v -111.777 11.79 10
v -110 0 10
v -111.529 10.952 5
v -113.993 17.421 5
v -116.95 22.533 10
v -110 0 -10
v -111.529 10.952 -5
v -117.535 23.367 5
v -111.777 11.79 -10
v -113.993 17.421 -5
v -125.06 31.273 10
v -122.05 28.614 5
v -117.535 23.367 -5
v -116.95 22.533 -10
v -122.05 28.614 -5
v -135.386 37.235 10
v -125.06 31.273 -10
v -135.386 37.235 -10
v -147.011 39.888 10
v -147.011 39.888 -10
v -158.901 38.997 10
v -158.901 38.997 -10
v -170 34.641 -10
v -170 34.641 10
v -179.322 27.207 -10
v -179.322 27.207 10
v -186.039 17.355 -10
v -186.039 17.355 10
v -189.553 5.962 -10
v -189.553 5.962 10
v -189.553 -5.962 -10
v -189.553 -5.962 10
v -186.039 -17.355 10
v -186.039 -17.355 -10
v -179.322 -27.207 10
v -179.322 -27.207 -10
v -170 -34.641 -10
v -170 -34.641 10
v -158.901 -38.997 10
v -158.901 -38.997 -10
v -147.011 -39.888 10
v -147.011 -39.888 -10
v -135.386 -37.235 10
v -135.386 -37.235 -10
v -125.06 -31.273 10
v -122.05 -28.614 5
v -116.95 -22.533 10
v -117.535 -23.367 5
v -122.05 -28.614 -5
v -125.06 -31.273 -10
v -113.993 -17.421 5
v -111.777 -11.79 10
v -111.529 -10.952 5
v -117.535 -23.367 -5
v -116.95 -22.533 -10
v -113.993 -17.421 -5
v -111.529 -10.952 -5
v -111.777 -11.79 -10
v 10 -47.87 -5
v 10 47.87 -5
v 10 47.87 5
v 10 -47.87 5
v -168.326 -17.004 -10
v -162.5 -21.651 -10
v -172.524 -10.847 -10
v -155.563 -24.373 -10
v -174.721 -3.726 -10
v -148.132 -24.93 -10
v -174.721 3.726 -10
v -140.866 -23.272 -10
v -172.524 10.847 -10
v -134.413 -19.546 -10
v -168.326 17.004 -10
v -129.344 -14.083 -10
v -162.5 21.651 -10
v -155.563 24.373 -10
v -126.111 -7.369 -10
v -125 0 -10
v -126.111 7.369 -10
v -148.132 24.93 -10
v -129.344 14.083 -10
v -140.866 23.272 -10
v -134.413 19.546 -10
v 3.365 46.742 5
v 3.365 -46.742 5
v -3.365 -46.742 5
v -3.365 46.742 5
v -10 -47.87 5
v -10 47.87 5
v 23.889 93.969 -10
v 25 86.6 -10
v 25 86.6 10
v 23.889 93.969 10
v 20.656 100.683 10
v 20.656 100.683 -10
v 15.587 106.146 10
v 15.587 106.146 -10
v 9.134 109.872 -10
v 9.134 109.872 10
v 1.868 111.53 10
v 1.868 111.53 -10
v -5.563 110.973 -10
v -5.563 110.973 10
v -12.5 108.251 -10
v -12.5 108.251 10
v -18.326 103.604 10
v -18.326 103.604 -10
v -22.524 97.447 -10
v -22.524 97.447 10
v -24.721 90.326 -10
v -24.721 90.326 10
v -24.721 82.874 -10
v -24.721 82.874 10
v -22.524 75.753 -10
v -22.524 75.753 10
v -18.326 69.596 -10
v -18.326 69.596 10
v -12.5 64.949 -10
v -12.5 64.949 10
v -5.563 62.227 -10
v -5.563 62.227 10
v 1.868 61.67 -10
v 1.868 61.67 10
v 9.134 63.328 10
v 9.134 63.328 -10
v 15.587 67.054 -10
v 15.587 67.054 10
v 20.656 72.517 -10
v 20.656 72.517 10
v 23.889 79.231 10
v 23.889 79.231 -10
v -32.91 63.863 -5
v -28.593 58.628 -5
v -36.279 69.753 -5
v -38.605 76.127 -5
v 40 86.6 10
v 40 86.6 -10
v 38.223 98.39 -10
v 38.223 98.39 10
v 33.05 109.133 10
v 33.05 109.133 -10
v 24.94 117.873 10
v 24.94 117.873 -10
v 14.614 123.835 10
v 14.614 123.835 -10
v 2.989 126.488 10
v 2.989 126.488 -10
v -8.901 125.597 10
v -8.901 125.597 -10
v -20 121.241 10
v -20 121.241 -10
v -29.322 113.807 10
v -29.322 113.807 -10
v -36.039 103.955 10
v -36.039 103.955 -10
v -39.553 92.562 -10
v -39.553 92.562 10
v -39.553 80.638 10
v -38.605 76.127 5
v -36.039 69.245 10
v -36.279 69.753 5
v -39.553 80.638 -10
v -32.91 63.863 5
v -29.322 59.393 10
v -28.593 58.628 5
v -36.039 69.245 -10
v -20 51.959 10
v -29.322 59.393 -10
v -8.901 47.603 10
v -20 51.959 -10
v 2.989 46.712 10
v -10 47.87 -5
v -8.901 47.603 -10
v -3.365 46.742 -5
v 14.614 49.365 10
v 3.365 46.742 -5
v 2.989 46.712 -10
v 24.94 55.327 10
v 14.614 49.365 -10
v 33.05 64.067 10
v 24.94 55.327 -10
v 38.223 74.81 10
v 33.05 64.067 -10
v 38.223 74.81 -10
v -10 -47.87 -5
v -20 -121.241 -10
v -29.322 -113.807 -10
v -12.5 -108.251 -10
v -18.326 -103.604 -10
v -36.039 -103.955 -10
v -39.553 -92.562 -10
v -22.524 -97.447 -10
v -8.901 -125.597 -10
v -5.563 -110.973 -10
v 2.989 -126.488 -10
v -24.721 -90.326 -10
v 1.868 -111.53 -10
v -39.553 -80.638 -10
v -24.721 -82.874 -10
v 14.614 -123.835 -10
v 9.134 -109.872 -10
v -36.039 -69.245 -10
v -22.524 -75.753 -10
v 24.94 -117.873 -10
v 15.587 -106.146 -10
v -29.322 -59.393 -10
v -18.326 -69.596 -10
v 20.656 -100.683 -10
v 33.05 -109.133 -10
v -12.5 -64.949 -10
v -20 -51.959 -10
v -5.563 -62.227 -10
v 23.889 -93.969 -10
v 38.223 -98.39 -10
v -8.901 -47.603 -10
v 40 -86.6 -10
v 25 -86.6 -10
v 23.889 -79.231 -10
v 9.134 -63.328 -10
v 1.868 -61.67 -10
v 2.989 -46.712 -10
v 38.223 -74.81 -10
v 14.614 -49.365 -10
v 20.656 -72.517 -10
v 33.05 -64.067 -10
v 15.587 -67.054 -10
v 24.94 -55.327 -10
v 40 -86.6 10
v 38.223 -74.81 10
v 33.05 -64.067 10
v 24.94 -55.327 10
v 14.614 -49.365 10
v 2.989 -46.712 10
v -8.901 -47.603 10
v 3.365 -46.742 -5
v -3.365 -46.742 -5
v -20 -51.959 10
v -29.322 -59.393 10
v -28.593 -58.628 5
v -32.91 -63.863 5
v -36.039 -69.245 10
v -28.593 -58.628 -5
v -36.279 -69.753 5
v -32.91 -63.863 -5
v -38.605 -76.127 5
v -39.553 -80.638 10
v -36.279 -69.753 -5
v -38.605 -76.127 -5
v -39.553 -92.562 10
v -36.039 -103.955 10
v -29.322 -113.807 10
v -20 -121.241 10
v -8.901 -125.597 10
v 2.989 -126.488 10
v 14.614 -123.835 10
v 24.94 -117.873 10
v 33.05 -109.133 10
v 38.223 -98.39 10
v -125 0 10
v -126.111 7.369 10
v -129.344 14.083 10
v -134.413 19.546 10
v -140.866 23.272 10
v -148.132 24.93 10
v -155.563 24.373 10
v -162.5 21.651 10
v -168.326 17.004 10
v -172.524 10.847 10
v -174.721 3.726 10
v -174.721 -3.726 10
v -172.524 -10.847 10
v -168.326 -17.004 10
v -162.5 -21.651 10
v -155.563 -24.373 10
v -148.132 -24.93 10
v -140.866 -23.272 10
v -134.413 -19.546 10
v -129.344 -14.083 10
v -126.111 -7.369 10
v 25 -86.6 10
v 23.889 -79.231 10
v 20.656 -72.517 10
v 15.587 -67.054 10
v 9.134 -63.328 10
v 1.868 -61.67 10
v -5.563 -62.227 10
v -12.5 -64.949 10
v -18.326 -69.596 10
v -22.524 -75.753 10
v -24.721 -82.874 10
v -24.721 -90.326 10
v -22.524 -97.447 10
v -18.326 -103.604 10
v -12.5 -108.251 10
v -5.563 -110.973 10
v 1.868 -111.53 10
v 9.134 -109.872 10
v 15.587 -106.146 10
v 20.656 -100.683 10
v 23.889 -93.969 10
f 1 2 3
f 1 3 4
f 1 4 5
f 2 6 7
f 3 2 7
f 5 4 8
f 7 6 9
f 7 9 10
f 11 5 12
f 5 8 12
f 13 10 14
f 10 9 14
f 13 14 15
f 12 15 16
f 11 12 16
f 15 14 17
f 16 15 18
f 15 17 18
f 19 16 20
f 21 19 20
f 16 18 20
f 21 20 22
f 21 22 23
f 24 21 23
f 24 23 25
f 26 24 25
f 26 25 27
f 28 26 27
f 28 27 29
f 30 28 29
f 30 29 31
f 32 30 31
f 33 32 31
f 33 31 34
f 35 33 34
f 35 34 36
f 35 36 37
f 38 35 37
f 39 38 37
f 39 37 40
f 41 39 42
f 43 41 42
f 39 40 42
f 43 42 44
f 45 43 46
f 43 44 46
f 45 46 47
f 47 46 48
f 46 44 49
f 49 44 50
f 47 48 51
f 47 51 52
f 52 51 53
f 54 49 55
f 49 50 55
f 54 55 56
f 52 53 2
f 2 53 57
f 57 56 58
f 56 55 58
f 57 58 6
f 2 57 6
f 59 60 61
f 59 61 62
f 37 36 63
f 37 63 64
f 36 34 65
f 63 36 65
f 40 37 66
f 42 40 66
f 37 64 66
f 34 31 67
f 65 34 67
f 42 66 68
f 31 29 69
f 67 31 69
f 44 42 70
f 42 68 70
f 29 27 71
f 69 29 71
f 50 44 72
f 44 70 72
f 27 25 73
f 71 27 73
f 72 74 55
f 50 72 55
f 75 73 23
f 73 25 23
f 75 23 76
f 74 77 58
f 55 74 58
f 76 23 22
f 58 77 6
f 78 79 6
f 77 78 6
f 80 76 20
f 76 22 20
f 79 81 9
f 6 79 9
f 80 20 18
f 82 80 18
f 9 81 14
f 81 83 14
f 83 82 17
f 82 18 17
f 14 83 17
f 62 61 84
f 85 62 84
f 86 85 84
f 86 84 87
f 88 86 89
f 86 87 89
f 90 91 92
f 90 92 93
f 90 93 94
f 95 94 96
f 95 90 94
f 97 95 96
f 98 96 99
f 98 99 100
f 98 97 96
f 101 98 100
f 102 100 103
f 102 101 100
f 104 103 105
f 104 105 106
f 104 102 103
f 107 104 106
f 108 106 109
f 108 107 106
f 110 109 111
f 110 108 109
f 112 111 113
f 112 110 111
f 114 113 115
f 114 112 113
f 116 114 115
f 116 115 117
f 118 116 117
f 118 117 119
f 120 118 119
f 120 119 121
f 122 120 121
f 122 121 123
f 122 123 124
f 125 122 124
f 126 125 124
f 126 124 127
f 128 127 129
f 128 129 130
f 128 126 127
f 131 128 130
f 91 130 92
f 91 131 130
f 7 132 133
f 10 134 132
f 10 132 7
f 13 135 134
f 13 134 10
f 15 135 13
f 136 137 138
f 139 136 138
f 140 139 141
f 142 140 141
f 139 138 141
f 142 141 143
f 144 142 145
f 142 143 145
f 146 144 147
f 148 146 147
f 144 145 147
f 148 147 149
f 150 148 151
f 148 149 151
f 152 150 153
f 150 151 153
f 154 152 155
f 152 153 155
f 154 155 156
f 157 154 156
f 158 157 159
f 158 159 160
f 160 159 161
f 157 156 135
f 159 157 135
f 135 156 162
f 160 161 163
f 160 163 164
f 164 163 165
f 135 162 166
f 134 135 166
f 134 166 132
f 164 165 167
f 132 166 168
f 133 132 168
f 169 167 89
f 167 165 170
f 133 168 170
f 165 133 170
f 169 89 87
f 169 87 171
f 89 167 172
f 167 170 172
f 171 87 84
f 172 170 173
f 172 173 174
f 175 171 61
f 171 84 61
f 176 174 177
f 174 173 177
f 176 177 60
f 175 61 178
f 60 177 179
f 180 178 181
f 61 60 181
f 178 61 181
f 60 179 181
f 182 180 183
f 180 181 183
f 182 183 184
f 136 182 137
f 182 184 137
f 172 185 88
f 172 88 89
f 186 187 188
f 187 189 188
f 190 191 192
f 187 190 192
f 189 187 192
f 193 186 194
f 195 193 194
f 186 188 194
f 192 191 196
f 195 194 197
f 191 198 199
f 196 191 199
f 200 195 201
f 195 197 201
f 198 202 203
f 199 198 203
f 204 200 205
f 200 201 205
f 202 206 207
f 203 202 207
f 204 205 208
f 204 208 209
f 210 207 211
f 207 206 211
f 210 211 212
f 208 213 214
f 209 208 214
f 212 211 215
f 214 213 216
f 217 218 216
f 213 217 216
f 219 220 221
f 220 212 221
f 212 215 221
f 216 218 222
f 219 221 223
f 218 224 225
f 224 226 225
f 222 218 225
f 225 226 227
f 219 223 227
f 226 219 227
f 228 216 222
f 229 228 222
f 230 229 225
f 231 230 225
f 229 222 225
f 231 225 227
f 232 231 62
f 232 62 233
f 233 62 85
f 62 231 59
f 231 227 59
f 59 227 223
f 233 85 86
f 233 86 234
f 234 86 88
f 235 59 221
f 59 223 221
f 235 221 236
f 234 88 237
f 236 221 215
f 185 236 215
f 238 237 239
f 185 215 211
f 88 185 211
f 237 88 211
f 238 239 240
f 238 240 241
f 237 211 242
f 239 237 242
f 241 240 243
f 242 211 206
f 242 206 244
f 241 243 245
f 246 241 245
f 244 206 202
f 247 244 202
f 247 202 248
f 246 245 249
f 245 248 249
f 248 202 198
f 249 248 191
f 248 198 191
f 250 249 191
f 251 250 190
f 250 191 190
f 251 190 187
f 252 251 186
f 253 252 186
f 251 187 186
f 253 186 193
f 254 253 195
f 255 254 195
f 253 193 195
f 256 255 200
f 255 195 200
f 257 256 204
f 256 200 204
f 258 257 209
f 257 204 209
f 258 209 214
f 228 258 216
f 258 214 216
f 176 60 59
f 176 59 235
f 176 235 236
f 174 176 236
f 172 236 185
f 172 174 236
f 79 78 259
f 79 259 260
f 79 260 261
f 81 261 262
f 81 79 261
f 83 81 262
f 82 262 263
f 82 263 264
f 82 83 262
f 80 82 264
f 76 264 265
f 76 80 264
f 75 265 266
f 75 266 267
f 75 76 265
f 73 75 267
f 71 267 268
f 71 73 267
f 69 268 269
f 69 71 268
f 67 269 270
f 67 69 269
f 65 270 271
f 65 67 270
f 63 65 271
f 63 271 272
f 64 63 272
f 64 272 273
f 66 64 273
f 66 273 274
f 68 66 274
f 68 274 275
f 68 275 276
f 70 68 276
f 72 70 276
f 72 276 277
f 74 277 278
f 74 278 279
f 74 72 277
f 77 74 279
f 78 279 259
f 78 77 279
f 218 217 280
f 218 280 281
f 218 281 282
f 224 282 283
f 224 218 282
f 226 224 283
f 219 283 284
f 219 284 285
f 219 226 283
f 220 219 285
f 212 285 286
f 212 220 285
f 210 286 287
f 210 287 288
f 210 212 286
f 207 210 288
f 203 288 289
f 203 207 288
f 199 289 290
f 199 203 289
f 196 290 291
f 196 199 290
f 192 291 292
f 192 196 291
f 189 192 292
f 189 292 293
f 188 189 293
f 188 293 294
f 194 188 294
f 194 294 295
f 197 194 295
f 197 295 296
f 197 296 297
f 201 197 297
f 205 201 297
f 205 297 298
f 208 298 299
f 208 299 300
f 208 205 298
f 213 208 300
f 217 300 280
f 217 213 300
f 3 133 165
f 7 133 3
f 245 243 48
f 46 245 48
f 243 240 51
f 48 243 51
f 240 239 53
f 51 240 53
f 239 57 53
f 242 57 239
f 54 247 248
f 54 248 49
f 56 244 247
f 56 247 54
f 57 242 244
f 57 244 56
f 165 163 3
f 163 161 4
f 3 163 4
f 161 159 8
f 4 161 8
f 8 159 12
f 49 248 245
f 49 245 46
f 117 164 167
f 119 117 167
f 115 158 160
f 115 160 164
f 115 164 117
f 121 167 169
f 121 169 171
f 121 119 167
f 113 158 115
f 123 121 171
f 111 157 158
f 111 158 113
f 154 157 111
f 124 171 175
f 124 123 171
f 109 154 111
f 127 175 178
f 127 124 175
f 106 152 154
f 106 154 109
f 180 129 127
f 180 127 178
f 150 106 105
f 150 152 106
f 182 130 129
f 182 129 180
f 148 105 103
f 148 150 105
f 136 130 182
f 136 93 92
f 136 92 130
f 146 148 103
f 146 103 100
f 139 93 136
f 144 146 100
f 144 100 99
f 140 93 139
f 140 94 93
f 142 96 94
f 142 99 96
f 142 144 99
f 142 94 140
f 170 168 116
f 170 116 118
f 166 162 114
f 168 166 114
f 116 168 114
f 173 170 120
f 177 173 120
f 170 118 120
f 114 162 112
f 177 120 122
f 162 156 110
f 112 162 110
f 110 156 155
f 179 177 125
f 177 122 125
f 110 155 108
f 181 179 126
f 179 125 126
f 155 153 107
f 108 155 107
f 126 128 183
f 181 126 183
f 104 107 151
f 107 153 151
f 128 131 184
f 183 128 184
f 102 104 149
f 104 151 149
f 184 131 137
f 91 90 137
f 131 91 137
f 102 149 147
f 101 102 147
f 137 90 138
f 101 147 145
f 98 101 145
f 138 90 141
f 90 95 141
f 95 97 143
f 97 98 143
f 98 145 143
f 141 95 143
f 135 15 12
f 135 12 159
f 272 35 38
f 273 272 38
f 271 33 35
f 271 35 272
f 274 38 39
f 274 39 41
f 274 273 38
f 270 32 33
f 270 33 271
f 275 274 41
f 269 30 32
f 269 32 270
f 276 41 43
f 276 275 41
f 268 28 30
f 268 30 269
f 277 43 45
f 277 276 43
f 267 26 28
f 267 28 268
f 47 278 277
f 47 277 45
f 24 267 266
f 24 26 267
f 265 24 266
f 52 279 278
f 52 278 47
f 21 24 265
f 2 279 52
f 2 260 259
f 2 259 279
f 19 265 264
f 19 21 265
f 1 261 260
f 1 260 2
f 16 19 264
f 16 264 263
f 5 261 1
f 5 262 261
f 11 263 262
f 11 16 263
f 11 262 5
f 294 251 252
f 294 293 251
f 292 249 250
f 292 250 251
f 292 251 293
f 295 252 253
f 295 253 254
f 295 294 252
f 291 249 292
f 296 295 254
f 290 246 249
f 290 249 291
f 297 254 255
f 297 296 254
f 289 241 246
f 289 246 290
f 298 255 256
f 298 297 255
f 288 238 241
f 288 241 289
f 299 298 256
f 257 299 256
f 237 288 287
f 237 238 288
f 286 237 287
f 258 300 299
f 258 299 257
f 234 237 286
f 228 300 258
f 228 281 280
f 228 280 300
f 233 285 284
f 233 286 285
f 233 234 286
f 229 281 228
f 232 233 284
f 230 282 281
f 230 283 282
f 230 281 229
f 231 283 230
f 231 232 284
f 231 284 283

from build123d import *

# Parameters (mm, degrees)
BOSS_EXTRUDE1_DEPTH        = 5
BOSS_EXTRUDE1_DEPTH_BACK   = 5
BOSS_EXTRUDE1_2_DEPTH      = 5
BOSS_EXTRUDE1_2_DEPTH_BACK = 5
BOSS_EXTRUDE1_3_DEPTH      = 5
BOSS_EXTRUDE1_3_DEPTH_BACK = 5
BOSS_EXTRUDE2_DEPTH        = 10
BOSS_EXTRUDE2_DEPTH_BACK   = 10
SKETCH1_6_R                = 40
SKETCH1_6_R_2              = 25


with BuildPart() as part:
    # Sketch1 → Boss-Extrude1 (new, two sides: drawn at the far end of the back side and taken through both)
    with BuildSketch(Plane.XY.offset(-BOSS_EXTRUDE1_DEPTH_BACK)):
        with BuildLine():
            Line((10, 47.870166538), (10, -47.870166538))
            ThreePointArc((10, -47.870166538), (0, -46.6), (-10, -47.870166538))
            Line((-10, -47.870166538), (-10, 47.870166538))
            ThreePointArc((-10, 47.870166538), (0, 46.6), (10, 47.870166538))
        make_face()
    extrude(amount=BOSS_EXTRUDE1_DEPTH + BOSS_EXTRUDE1_DEPTH_BACK)



with BuildPart() as body_2:
    # Sketch1 → Boss-Extrude1 2 (new, two sides: drawn at the far end of the back side and taken through both)
    with BuildSketch(Plane.XY.offset(-BOSS_EXTRUDE1_2_DEPTH_BACK)):
        with BuildLine():
            Line((-122.049730922, 28.614375032), (-38.604515092, 76.126633087))
            ThreePointArc((-38.604515092, 76.126633087), (-34.719424314, 66.736425918), (-28.593413405, 58.628287327))
            Line((-28.593413405, 58.628287327), (-111.528626884, 10.952326263))
            ThreePointArc((-111.528626884, 10.952326263), (-115.635110511, 20.470817531), (-122.049730922, 28.614375032))
        make_face()
    extrude(amount=BOSS_EXTRUDE1_2_DEPTH + BOSS_EXTRUDE1_2_DEPTH_BACK)


with BuildPart() as body_3:
    # Sketch1 → Boss-Extrude1 3 (new, two sides: drawn at the far end of the back side and taken through both)
    with BuildSketch(Plane.XY.offset(-BOSS_EXTRUDE1_3_DEPTH_BACK)):
        with BuildLine():
            Line((-111.528626884, -10.952326263), (-28.593413405, -58.628287327))
            ThreePointArc((-28.593413405, -58.628287327), (-34.719424235, -66.736425963), (-38.604515092, -76.126633087))
            Line((-38.604515092, -76.126633087), (-122.049730922, -28.614375032))
            ThreePointArc((-122.049730922, -28.614375032), (-115.635110511, -20.470817531), (-111.528626884, -10.952326263))
        make_face()
    extrude(amount=BOSS_EXTRUDE1_3_DEPTH + BOSS_EXTRUDE1_3_DEPTH_BACK)


with BuildPart() as part_1:
    add(part.part)

    add(body_2.part)  # Boss-Extrude2 merges body 2

    add(body_3.part)  # Boss-Extrude2 merges body 3
    # Sketch1<6> → Boss-Extrude2 (add, two sides: drawn at the far end of the back side and taken through both)
    # profile 1 of 3: a face of its own
    with BuildSketch(Plane.XY.offset(-BOSS_EXTRUDE2_DEPTH_BACK)):
        with Locations((0, 86.6)):
            Circle(SKETCH1_6_R)
        with Locations((0, 86.6)):
            Circle(SKETCH1_6_R_2, mode=Mode.SUBTRACT)
    # profile 2 of 3: a face of its own
    with BuildSketch(Plane.XY.offset(-BOSS_EXTRUDE2_DEPTH_BACK)):
        with Locations((0, -86.6)):
            Circle(SKETCH1_6_R)
        with Locations((0, -86.6)):
            Circle(SKETCH1_6_R_2, mode=Mode.SUBTRACT)
    # profile 3 of 3: a face of its own
    with BuildSketch(Plane.XY.offset(-BOSS_EXTRUDE2_DEPTH_BACK)):
        with Locations((-150, 0)):
            Circle(SKETCH1_6_R)
        with Locations((-150, 0)):
            Circle(SKETCH1_6_R_2, mode=Mode.SUBTRACT)
    extrude(amount=BOSS_EXTRUDE2_DEPTH + BOSS_EXTRUDE2_DEPTH_BACK)


solid = part_1.part
